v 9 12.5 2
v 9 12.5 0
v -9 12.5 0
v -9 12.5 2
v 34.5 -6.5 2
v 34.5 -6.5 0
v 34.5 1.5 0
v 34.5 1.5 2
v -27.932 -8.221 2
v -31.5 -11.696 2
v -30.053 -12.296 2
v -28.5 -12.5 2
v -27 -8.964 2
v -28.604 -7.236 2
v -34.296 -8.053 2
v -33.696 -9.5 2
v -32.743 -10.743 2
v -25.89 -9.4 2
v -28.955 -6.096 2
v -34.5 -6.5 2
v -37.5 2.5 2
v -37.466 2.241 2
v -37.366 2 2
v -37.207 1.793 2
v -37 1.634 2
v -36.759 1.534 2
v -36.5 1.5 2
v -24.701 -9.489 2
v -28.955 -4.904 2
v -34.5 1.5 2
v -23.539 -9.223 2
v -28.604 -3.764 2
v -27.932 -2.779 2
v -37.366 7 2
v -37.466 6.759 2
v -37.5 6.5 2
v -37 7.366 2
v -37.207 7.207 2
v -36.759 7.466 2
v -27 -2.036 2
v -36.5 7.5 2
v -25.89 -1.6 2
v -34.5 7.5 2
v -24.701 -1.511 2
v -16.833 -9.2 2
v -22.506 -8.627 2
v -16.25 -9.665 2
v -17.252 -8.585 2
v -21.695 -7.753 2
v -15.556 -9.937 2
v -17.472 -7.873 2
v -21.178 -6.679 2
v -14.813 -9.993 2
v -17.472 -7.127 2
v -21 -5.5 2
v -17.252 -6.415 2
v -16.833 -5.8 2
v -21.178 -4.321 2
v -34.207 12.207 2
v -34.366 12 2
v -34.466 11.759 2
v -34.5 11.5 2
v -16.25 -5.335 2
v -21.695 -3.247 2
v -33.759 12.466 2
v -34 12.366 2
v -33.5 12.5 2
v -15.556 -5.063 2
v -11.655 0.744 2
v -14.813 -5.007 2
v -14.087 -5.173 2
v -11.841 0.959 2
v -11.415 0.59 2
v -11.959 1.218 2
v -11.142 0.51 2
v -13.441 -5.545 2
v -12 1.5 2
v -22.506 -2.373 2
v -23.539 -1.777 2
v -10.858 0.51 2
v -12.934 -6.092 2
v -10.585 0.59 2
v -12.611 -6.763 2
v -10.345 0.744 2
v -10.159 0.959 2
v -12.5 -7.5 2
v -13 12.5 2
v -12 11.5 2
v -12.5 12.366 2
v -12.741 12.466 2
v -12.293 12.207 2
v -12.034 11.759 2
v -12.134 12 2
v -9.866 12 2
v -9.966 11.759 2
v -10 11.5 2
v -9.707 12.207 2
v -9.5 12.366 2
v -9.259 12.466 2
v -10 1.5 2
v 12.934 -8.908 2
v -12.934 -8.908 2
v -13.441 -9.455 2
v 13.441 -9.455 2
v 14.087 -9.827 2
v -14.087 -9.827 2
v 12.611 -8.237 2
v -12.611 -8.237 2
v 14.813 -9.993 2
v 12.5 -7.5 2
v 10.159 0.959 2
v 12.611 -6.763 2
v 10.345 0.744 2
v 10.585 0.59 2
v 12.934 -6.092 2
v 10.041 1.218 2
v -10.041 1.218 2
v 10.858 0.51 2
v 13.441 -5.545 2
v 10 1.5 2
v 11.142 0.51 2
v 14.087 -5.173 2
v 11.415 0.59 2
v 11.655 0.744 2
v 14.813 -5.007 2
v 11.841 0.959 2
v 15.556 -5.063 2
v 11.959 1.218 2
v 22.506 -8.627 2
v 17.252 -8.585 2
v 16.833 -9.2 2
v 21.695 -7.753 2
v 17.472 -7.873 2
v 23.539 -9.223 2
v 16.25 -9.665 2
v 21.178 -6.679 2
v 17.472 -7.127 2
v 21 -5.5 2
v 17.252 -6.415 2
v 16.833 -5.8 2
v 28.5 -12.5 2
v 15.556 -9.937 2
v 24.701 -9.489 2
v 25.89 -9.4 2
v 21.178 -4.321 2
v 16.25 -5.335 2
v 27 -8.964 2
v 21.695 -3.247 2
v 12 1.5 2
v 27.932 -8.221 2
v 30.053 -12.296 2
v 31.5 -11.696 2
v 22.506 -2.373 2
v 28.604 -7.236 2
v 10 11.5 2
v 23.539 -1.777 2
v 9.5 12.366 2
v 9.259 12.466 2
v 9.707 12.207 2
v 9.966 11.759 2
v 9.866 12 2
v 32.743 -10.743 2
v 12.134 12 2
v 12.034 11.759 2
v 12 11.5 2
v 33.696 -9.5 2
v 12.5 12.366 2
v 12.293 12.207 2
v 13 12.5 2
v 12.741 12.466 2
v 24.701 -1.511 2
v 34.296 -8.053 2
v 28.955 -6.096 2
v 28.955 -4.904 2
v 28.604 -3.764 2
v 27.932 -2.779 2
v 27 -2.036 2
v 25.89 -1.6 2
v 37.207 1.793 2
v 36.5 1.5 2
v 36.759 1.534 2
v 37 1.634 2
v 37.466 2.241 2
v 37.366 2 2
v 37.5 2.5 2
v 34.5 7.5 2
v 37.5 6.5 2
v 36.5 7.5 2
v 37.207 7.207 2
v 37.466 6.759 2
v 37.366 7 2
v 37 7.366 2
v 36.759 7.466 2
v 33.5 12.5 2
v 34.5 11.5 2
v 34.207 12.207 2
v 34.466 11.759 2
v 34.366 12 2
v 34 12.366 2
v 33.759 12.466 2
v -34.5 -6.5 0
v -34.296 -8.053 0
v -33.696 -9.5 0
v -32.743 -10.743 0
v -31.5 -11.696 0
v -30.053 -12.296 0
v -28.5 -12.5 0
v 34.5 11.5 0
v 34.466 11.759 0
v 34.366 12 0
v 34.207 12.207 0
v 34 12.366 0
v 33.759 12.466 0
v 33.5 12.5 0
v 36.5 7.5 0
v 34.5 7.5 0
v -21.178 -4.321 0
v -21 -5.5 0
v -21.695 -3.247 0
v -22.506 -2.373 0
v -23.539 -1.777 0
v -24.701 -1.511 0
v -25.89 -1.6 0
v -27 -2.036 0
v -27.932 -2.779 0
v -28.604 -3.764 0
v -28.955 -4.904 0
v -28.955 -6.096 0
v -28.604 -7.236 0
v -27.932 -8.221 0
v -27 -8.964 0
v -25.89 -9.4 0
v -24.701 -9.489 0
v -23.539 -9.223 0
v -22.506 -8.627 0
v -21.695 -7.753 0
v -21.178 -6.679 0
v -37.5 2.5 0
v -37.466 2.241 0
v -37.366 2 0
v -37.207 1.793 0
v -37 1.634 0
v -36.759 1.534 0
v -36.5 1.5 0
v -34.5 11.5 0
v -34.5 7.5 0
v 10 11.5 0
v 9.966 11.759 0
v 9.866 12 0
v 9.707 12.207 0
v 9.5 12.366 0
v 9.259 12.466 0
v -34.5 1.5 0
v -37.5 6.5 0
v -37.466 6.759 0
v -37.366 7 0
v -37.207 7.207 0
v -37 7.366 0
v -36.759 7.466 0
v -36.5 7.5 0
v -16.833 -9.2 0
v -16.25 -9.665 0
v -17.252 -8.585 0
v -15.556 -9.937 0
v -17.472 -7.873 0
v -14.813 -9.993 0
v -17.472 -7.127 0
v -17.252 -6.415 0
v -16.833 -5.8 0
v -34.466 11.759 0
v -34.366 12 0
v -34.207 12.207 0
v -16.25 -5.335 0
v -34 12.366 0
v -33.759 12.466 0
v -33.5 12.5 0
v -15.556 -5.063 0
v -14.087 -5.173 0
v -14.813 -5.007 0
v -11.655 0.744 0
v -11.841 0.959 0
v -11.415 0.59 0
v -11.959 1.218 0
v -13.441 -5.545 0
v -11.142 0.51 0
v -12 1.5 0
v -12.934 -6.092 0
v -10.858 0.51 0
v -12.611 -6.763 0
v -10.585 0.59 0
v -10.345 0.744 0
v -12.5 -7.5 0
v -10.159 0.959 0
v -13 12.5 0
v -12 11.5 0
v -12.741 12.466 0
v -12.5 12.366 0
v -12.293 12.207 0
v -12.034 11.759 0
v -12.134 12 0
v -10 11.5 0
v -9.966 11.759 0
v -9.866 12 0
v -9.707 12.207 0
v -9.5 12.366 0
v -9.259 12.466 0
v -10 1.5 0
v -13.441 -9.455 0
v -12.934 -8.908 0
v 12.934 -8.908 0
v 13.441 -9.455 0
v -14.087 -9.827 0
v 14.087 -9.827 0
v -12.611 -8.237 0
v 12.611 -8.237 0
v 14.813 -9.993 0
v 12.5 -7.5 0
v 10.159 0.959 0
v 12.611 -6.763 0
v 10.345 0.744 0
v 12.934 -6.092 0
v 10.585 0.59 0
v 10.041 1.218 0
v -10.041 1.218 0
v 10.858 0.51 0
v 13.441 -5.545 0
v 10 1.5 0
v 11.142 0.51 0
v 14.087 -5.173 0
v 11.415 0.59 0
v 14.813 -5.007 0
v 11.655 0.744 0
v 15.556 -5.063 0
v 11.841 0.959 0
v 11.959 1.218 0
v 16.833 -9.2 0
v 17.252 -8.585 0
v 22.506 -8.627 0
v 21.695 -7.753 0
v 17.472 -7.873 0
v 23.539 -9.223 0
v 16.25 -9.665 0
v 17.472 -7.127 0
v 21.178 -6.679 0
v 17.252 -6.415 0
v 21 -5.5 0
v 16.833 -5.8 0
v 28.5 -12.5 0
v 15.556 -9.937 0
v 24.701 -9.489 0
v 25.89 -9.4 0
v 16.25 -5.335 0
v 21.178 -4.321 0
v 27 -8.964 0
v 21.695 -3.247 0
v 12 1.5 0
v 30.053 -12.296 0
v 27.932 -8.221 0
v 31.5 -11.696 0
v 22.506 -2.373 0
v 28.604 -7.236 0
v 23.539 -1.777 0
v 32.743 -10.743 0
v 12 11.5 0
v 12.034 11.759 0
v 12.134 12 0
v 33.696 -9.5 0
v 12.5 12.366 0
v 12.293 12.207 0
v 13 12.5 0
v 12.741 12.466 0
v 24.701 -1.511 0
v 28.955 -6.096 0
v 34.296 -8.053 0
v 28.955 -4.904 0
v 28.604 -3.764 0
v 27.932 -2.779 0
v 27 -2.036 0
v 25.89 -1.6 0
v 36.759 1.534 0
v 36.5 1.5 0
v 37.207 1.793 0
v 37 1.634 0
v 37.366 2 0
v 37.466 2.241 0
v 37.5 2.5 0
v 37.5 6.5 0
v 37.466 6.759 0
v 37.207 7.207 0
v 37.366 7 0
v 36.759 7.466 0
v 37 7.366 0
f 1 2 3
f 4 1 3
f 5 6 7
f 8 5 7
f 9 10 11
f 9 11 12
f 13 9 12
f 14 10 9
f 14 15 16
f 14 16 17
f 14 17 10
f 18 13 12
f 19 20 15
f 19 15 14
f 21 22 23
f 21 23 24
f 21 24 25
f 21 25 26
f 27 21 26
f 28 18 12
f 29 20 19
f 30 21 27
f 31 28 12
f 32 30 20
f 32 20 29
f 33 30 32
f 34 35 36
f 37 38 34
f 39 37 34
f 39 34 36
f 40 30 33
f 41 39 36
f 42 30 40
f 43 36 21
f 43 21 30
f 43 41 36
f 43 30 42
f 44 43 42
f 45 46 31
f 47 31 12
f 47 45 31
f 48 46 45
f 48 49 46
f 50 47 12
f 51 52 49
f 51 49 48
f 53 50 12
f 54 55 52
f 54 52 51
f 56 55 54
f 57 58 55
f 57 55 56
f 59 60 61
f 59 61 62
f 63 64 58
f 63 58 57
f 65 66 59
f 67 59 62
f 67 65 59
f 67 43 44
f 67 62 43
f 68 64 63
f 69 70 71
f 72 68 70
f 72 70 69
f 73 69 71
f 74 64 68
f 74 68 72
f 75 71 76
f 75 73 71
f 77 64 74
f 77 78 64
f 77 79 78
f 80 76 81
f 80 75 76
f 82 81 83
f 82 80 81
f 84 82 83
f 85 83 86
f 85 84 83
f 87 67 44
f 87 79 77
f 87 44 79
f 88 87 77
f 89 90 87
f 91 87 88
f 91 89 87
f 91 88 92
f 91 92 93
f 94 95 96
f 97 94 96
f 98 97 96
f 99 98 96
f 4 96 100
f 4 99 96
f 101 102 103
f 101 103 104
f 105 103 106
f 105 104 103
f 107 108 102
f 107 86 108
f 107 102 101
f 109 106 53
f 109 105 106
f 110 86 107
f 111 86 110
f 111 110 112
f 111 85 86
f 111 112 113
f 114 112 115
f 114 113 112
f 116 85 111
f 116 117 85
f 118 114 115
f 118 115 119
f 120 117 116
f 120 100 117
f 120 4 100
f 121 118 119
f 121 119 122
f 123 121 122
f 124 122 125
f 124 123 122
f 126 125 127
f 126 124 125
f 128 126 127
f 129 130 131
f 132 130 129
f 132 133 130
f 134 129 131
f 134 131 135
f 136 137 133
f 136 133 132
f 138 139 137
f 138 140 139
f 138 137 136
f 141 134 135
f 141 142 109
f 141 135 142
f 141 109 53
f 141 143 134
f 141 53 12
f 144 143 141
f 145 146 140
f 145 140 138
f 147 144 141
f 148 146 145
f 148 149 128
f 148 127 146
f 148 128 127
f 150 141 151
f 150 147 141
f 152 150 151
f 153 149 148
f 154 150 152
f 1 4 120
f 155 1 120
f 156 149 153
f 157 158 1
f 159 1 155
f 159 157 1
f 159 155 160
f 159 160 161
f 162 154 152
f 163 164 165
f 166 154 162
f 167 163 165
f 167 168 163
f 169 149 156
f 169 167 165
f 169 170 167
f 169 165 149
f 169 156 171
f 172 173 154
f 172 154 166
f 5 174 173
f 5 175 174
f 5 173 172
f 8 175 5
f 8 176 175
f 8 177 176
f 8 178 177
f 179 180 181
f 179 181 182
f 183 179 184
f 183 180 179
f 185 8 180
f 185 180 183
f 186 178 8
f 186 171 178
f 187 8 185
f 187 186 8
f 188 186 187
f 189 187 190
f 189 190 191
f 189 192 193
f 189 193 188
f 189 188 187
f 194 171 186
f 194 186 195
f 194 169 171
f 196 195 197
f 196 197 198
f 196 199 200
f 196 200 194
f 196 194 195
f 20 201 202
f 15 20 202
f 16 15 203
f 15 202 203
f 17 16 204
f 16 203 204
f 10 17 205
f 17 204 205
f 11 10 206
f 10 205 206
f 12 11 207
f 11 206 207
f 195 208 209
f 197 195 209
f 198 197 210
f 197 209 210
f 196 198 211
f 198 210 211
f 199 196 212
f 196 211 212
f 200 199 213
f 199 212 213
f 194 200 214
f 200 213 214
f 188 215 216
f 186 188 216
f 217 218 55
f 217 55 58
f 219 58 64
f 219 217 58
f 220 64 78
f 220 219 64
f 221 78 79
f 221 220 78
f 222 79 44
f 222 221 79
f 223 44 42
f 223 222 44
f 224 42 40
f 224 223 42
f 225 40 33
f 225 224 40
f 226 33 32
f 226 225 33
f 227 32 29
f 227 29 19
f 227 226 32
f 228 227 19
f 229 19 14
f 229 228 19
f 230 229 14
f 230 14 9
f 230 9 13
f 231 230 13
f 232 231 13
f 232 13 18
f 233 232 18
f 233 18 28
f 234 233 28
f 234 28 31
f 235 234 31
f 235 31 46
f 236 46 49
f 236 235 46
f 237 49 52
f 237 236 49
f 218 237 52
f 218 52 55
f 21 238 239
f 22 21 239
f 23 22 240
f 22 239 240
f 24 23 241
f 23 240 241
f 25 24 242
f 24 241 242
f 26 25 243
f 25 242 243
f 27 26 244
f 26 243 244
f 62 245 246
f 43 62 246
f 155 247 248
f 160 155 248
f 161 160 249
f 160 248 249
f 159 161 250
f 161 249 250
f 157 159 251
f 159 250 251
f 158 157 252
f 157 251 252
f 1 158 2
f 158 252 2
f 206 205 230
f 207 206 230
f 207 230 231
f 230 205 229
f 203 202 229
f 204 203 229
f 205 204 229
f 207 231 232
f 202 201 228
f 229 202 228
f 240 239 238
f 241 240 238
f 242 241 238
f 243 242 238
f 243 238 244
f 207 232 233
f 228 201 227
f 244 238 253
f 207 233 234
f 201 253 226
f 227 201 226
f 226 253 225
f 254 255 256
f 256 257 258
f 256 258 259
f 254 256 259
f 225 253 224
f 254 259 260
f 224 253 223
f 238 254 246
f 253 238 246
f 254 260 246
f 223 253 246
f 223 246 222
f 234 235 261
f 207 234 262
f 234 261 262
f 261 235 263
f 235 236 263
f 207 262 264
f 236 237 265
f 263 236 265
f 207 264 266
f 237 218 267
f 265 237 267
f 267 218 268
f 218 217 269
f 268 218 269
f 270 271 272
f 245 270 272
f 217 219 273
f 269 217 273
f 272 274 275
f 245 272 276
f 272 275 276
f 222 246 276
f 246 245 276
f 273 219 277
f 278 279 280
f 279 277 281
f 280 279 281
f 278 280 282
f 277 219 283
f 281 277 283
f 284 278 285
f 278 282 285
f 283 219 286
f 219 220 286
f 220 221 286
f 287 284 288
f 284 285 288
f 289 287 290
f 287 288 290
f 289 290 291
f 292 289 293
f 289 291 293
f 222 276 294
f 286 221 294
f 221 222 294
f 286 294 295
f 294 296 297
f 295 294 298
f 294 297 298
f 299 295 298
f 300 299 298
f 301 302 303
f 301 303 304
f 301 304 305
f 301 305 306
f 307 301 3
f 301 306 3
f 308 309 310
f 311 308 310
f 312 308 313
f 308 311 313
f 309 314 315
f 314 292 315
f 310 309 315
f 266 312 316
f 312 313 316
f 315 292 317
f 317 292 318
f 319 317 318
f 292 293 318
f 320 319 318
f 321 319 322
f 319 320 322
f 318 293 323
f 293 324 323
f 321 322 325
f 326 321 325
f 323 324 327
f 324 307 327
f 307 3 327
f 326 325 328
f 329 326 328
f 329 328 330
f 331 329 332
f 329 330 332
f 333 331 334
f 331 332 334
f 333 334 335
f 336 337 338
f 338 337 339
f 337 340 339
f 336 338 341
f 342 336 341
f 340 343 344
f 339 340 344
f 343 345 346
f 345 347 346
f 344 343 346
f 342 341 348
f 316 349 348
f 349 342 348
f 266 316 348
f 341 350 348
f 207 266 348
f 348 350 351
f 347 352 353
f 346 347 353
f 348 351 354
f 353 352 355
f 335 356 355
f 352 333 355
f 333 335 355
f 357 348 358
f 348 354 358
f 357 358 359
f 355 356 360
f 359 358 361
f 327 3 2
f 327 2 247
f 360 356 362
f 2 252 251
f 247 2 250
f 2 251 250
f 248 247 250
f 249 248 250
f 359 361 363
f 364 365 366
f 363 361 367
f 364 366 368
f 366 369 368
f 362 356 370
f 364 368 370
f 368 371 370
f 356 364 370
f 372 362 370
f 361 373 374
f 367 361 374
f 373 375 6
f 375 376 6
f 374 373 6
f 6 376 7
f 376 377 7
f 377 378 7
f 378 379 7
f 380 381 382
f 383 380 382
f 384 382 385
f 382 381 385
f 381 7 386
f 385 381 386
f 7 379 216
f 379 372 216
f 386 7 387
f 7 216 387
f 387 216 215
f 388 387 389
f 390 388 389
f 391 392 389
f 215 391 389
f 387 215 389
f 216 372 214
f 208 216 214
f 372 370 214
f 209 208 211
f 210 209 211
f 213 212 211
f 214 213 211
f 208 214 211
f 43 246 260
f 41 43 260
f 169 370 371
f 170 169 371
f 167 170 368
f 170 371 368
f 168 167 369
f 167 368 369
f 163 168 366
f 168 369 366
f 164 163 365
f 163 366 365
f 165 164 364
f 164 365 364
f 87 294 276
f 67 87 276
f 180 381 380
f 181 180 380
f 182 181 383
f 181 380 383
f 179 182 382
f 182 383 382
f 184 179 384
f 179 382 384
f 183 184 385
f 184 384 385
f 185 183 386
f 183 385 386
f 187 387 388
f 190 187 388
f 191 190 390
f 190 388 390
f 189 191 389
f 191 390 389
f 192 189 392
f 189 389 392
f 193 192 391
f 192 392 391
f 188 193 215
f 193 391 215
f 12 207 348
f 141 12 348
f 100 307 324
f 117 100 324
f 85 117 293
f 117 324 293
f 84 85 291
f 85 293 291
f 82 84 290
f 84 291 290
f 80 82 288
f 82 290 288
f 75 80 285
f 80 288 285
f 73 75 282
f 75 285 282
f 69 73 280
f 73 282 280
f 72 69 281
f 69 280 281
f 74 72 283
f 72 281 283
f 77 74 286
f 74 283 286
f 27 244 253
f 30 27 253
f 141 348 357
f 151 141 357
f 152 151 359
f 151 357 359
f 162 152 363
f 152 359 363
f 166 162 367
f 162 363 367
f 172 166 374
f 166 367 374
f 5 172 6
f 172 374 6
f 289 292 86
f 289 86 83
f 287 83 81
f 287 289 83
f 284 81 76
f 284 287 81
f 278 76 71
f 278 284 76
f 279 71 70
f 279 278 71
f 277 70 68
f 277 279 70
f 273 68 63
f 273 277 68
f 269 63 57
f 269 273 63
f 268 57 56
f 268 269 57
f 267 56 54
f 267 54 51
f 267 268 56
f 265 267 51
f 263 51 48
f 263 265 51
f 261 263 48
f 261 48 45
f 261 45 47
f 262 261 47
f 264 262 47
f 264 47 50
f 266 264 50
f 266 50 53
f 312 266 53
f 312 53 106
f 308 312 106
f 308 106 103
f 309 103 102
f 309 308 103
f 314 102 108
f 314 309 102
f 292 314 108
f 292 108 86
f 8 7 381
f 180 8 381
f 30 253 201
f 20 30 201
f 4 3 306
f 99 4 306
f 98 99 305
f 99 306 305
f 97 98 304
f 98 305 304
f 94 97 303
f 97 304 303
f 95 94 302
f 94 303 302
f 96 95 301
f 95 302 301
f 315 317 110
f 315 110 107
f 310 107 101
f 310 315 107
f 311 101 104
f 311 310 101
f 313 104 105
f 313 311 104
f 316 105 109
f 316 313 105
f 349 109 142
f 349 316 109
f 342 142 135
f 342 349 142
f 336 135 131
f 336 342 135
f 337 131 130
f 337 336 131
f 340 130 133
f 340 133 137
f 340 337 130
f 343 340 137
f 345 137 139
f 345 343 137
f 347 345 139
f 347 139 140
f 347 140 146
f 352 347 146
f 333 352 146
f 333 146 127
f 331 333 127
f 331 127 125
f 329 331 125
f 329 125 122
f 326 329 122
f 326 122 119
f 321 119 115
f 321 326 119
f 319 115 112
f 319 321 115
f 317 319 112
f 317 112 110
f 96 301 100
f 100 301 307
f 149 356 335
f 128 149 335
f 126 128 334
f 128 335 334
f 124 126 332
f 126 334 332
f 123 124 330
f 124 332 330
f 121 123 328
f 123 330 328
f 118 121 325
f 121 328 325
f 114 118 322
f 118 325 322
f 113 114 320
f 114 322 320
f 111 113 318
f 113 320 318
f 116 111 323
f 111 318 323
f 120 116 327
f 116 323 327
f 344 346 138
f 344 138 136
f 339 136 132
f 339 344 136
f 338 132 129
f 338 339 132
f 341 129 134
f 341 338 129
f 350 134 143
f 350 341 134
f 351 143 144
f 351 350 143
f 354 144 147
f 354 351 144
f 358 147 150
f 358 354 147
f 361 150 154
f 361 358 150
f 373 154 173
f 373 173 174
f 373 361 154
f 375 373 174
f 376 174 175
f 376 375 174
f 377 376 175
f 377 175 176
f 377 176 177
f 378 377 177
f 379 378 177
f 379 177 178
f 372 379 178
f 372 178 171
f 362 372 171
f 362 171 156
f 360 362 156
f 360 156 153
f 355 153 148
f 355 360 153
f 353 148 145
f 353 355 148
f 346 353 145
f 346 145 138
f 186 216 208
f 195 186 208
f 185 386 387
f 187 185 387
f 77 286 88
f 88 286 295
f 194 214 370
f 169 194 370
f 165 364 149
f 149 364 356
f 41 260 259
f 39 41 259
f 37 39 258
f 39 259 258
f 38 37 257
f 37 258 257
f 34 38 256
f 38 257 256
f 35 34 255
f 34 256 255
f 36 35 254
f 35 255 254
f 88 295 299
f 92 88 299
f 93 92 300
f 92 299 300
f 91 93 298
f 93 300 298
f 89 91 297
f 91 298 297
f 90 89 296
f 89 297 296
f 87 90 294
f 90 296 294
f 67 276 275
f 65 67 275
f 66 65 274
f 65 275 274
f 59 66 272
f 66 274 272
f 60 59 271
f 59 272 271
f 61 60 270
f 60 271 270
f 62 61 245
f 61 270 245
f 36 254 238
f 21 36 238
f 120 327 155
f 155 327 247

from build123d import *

# Parameters (mm, degrees)
ESBO_O1_R                = 4
ESBO_O1_R_2              = 2.5
RESSALTO_EXTRUS_O1_DEPTH = 2


with BuildPart() as part:
    # Esboço1 → Ressalto-extrusão1 (new body)
    with BuildSketch(Plane.XY):
        with BuildLine():
            Line((-34.5, 1.5), (-34.5, -6.5))
            ThreePointArc((-34.5, -6.5), (-32.742640687, -10.742640687), (-28.5, -12.5))
            Line((-28.5, -12.5), (28.5, -12.5))
            ThreePointArc((28.5, -12.5), (32.742640687, -10.742640687), (34.5, -6.5))
            Line((34.5, -6.5), (34.5, 1.5))
            Line((34.5, 1.5), (36.5, 1.5))
            ThreePointArc((36.5, 1.5), (37.207106781, 1.792893219), (37.5, 2.5))
            Line((37.5, 2.5), (37.5, 6.5))
            ThreePointArc((37.5, 6.5), (37.207106781, 7.207106781), (36.5, 7.5))
            Line((36.5, 7.5), (34.5, 7.5))
            Line((34.5, 7.5), (34.5, 11.5))
            ThreePointArc((34.5, 11.5), (34.207106781, 12.207106781), (33.5, 12.5))
            Line((33.5, 12.5), (13, 12.5))
            ThreePointArc((13, 12.5), (12.292893219, 12.207106781), (12, 11.5))
            Line((12, 11.5), (12, 1.5))
            ThreePointArc((12, 1.5), (11, 0.5), (10, 1.5))
            Line((10, 1.5), (10, 11.5))
            ThreePointArc((10, 11.5), (9.707106781, 12.207106781), (9, 12.5))
            Line((9, 12.5), (-9, 12.5))
            ThreePointArc((-9, 12.5), (-9.707106781, 12.207106781), (-10, 11.5))
            Line((-10, 11.5), (-10, 1.5))
            ThreePointArc((-10, 1.5), (-11, 0.5), (-12, 1.5))
            Line((-12, 1.5), (-12, 11.5))
            ThreePointArc((-12, 11.5), (-12.292893219, 12.207106781), (-13, 12.5))
            Line((-13, 12.5), (-33.5, 12.5))
            ThreePointArc((-33.5, 12.5), (-34.207106781, 12.207106781), (-34.5, 11.5))
            Line((-34.5, 11.5), (-34.5, 7.5))
            Line((-34.5, 7.5), (-36.5, 7.5))
            ThreePointArc((-36.5, 7.5), (-37.207106781, 7.207106781), (-37.5, 6.5))
            Line((-37.5, 6.5), (-37.5, 2.5))
            ThreePointArc((-37.5, 2.5), (-37.207106781, 1.792893219), (-36.5, 1.5))
            Line((-36.5, 1.5), (-34.5, 1.5))
        make_face()
        with Locations((-25, -5.5)):
            Circle(ESBO_O1_R, mode=Mode.SUBTRACT)
        with Locations((-15, -7.5)):
            Circle(ESBO_O1_R_2, mode=Mode.SUBTRACT)
        with Locations(Location((15, -7.5, 0), (0, 0, 180))):
            Circle(ESBO_O1_R_2, mode=Mode.SUBTRACT)
        with Locations(Location((25, -5.5, 0), (0, 0, 180))):
            Circle(ESBO_O1_R, mode=Mode.SUBTRACT)
    extrude(amount=RESSALTO_EXTRUS_O1_DEPTH)


solid = part.part
